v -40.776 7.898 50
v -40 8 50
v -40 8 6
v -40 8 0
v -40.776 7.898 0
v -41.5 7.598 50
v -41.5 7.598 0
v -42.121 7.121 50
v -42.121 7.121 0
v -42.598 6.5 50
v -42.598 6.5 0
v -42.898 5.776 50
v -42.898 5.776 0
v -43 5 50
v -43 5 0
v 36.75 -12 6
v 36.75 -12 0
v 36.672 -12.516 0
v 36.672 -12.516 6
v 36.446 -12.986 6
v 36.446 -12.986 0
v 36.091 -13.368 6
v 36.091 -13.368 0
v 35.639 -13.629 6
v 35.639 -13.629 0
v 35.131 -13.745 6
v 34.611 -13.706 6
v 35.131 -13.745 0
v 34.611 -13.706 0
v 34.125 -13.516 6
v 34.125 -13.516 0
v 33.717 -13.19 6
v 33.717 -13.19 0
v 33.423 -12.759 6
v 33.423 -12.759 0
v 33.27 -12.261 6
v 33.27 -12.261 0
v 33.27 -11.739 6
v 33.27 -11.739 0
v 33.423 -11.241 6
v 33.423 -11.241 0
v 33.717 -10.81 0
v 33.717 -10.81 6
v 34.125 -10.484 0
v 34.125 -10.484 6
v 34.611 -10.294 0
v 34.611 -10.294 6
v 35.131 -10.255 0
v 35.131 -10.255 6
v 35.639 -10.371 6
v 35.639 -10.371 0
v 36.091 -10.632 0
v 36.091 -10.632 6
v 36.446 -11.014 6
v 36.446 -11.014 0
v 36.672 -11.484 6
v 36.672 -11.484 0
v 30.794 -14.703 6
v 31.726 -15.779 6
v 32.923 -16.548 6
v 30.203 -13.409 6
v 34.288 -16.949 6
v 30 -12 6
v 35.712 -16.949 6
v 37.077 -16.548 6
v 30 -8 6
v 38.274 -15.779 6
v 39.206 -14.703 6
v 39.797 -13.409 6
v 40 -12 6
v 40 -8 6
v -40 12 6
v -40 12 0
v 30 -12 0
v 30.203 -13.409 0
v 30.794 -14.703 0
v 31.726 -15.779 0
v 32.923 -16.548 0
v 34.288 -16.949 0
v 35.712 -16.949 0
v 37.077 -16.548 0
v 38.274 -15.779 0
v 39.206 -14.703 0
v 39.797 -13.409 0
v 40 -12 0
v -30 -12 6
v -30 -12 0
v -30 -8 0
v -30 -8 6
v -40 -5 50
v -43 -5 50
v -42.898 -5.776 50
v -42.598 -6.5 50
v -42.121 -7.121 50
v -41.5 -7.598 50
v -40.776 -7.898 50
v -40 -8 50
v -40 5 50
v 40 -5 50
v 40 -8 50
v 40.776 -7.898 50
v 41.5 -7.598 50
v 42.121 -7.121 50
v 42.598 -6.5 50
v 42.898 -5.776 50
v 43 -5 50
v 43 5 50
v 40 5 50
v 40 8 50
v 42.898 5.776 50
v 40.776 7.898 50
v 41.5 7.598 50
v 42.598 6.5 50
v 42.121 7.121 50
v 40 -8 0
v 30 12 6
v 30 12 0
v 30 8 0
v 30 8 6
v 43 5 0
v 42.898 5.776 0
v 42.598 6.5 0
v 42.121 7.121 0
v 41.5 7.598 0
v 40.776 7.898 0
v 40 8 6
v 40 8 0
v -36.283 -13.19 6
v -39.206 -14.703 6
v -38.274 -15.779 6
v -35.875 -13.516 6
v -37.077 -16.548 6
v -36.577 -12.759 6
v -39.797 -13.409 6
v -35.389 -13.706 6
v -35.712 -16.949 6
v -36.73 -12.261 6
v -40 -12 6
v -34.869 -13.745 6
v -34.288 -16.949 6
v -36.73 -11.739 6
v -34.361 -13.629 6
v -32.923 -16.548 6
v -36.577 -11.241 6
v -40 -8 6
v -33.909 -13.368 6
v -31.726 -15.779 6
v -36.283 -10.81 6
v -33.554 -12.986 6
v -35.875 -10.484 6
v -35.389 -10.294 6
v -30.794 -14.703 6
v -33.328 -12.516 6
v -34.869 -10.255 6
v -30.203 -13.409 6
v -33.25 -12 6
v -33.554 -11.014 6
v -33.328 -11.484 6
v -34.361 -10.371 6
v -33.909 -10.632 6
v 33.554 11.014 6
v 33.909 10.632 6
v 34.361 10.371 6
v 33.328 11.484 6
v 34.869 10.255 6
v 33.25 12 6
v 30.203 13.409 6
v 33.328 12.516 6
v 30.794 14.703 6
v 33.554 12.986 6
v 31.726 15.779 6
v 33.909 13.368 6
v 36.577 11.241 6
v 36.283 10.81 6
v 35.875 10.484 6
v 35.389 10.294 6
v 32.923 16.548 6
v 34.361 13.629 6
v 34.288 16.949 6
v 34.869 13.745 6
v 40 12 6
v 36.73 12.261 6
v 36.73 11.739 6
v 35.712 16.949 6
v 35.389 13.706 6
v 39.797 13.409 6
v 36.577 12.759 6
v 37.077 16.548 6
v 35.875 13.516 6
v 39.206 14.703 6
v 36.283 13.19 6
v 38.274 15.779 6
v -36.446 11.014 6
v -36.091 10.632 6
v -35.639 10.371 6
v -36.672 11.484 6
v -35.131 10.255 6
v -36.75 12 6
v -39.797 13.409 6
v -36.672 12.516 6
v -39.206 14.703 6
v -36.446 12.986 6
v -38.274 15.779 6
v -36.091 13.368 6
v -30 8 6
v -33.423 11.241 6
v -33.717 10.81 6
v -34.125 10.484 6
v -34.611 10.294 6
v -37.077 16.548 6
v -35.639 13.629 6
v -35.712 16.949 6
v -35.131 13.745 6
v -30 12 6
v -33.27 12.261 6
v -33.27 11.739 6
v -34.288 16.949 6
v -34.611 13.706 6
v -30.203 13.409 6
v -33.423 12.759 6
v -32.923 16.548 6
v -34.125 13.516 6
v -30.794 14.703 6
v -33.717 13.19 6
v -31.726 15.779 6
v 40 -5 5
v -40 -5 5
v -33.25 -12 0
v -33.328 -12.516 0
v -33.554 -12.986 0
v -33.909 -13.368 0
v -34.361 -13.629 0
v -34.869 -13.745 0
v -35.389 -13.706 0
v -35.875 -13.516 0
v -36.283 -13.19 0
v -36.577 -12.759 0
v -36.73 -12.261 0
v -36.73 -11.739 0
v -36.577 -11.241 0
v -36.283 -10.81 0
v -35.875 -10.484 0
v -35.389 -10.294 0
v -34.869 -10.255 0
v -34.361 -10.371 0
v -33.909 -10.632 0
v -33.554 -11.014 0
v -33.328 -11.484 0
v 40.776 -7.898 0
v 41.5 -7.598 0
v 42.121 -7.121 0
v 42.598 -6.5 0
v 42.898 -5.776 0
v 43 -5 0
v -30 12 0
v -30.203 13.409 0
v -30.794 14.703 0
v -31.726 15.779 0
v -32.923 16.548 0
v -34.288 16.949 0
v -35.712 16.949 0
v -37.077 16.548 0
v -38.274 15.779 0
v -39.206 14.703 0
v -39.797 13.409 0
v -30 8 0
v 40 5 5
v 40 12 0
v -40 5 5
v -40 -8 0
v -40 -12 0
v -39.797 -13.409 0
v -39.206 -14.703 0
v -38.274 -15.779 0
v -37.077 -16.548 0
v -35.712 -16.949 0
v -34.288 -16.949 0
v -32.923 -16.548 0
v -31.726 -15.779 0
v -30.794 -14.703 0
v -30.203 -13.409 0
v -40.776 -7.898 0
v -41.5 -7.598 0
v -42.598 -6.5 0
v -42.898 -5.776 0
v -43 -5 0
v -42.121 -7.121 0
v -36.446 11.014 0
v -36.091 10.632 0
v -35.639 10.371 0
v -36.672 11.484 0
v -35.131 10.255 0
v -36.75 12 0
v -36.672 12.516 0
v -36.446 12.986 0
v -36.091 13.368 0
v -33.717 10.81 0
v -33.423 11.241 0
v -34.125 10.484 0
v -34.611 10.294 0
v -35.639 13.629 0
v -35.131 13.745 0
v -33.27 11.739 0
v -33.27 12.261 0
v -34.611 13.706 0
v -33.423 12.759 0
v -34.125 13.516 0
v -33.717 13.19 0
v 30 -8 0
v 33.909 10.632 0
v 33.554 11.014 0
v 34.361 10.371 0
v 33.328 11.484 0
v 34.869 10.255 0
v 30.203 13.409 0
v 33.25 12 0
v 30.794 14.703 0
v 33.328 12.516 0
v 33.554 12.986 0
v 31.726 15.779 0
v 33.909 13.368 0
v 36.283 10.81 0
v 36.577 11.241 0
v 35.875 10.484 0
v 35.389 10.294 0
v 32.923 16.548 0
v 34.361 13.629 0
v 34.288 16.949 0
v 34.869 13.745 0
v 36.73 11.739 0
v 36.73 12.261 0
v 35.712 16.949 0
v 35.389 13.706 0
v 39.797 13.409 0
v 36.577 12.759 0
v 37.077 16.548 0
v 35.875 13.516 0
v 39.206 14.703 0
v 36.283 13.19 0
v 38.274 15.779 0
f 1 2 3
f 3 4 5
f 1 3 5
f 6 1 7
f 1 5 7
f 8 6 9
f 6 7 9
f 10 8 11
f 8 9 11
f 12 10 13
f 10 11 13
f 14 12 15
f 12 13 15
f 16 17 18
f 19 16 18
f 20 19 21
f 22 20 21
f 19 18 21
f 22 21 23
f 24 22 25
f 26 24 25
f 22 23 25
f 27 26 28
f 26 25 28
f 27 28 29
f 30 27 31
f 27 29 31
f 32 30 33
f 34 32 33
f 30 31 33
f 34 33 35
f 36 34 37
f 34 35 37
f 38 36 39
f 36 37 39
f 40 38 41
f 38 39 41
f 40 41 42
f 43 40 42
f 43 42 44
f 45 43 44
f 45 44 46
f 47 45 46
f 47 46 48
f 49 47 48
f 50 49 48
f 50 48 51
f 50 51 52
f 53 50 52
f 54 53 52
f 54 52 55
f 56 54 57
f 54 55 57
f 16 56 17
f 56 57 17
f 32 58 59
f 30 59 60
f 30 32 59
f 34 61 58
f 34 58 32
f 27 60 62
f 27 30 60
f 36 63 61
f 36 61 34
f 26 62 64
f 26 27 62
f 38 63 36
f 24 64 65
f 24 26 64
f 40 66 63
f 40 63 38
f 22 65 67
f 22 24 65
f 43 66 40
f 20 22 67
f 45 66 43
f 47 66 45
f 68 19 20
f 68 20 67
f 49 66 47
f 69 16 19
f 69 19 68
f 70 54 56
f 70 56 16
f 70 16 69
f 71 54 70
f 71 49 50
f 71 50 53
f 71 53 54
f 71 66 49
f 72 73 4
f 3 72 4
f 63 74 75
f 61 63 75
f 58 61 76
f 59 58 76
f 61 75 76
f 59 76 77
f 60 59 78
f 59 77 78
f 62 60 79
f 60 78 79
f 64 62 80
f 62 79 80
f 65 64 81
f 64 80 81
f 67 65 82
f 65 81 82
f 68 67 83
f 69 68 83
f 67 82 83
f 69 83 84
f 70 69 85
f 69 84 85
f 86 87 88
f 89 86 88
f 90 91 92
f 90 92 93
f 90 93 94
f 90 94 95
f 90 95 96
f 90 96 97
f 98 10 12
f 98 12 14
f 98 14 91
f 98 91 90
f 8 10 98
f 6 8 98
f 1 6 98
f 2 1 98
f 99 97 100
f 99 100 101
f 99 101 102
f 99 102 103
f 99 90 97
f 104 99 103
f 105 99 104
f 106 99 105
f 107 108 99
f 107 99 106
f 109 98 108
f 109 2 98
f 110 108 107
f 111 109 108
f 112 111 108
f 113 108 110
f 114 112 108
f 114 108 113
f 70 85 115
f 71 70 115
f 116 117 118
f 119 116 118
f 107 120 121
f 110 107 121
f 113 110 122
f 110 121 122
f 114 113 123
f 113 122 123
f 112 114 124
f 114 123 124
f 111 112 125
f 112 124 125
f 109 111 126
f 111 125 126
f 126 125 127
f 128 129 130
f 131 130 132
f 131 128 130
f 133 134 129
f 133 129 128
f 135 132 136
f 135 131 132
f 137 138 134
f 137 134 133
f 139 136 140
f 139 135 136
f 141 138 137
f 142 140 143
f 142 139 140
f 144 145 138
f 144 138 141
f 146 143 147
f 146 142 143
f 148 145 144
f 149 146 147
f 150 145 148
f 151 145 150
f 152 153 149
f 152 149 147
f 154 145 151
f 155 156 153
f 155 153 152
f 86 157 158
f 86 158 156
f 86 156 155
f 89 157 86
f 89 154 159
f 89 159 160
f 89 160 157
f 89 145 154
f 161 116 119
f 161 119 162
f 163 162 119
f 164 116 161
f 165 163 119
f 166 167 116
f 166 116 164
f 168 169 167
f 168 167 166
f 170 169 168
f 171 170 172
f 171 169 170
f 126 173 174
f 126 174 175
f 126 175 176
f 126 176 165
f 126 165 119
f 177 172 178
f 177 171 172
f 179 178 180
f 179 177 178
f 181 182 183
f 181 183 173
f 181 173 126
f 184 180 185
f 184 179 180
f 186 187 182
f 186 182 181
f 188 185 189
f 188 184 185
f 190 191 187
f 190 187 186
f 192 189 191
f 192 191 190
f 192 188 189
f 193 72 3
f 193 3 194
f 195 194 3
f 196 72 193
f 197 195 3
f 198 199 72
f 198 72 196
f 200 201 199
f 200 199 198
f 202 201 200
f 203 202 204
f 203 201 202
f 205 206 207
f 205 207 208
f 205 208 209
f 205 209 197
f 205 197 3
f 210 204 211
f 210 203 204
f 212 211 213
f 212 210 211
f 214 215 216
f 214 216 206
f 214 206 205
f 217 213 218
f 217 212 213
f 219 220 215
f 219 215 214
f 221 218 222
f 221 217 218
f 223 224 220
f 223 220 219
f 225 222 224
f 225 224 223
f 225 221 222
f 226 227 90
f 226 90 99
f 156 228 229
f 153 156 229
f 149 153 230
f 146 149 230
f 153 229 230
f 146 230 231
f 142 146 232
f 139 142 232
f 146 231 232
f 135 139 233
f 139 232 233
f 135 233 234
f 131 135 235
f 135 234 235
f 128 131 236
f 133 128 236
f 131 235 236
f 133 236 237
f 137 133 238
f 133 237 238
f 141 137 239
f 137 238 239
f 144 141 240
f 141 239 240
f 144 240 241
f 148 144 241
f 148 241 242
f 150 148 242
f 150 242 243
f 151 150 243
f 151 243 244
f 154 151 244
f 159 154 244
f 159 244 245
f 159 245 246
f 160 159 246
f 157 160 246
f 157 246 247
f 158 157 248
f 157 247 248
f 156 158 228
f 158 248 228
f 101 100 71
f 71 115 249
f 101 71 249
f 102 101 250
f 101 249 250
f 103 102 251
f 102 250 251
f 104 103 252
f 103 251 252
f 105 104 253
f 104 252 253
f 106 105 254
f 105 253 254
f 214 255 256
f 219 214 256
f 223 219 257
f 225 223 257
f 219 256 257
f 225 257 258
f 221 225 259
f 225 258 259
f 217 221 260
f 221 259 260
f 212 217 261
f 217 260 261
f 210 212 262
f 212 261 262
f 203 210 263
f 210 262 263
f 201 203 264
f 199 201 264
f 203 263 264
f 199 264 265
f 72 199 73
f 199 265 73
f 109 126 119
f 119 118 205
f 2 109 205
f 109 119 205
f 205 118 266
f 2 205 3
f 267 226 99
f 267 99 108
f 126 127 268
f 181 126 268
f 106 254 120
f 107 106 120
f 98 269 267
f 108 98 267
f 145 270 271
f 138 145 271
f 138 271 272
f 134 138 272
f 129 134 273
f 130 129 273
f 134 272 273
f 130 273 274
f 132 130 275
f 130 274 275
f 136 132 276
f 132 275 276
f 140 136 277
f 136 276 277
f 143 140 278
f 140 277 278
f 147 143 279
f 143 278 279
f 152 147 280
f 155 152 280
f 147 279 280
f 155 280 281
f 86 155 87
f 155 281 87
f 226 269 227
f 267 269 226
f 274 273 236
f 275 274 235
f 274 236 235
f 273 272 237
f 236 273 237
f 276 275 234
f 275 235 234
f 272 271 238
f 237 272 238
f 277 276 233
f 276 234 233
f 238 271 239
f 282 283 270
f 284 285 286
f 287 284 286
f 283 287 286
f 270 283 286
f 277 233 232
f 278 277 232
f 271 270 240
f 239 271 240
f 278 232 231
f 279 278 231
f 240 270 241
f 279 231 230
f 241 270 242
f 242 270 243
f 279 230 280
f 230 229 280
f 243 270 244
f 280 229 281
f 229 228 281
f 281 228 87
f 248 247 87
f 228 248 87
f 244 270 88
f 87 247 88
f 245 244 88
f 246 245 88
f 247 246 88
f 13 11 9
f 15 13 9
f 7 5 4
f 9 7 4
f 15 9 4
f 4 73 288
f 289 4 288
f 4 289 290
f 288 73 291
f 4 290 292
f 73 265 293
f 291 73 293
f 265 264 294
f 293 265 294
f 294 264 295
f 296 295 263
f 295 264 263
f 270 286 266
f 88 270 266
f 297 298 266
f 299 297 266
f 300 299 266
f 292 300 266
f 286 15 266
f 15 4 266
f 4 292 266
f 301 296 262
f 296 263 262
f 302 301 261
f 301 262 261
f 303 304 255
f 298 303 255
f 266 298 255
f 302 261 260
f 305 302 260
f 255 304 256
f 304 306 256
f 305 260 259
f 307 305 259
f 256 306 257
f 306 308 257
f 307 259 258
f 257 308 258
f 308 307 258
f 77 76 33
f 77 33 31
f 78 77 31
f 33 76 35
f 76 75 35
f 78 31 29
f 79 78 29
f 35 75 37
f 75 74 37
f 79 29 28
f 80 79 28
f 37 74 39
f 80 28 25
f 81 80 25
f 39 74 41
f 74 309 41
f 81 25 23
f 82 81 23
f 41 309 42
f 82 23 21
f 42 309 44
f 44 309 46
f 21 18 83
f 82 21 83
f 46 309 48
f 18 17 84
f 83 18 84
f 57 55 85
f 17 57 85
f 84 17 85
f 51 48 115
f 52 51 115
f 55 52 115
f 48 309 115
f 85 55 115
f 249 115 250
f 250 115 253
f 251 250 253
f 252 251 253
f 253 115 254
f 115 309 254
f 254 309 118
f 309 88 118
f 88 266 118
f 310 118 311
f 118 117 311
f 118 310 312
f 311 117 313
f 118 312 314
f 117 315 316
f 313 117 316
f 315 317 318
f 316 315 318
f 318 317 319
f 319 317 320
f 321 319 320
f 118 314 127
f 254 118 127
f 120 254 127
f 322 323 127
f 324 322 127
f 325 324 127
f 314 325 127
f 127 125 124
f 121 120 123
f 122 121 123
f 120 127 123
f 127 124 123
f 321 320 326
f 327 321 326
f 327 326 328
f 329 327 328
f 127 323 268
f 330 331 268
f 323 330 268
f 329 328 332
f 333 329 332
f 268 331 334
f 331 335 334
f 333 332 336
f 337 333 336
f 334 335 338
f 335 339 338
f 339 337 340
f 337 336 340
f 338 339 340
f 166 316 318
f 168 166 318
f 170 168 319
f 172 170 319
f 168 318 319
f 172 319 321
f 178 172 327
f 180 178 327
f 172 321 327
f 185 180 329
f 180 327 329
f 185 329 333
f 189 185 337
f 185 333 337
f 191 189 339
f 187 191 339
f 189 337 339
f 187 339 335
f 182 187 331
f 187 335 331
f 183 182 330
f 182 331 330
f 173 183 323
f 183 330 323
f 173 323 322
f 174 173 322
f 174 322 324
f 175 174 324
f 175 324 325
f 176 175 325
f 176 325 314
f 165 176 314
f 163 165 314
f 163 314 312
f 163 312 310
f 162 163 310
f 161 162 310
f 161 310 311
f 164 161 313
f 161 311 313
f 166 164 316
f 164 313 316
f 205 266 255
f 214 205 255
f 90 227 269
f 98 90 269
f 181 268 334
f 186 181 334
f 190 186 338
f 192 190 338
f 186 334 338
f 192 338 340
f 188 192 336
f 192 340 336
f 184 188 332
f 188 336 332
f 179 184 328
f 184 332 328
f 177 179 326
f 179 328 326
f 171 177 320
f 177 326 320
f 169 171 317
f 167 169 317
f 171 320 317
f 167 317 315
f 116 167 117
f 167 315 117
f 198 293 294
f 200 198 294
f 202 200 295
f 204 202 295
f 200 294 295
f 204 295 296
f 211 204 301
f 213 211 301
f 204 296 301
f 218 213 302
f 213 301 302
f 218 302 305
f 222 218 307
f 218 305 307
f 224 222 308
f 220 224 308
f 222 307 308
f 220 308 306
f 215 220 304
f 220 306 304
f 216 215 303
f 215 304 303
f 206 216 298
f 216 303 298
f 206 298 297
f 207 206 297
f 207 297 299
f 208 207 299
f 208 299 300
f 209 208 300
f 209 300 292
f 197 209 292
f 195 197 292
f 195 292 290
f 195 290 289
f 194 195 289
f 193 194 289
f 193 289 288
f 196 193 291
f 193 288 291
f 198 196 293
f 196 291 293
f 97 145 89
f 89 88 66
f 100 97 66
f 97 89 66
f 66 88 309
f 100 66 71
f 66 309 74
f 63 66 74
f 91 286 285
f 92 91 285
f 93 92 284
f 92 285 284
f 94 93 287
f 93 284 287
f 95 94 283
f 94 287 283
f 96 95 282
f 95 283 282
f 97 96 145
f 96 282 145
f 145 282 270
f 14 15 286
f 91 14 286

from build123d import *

# Parameters (mm, degrees)
F0_W     = 80
F0_H     = 10
F1_DEPTH = 50
F2_W     = 80
F2_H     = 10
F3_DEPTH = 5
F4_DEPTH = 6


with BuildPart() as f1:
    # F0 (on Top) → F1 (new body)
    with BuildSketch(Plane.XY):
        with BuildLine():
            ThreePointArc((43, 5), (42.12132, 7.12132), (40, 8))
            Line((40, 8), (30, 8))
            Line((30, 8), (-30, 8))
            Line((-30, 8), (-40, 8))
            ThreePointArc((-40, 8), (-42.12132, 7.12132), (-43, 5))
            Line((-43, 5), (-43, -5))
            ThreePointArc((-43, -5), (-42.12132, -7.12132), (-40, -8))
            Line((-40, -8), (-30, -8))
            Line((-30, -8), (30, -8))
            Line((30, -8), (40, -8))
            ThreePointArc((40, -8), (42.12132, -7.12132), (43, -5))
            Line((43, -5), (43, 5))
        make_face()
        Rectangle(F0_W, F0_H, mode=Mode.SUBTRACT)
    extrude(amount=F1_DEPTH)

    # F2 (on Top) → F3 (join)
    with BuildSketch(Plane.XY):
        Rectangle(F2_W, F2_H)
    extrude(amount=F3_DEPTH)

    # F0 (on Top) → F4 (join)
    with BuildSketch(Plane.XY):
        with BuildLine():
            ThreePointArc((43, 5), (42.12132, 7.12132), (40, 8))
            Line((40, 8), (30, 8))
            Line((30, 8), (-30, 8))
            Line((-30, 8), (-40, 8))
            ThreePointArc((-40, 8), (-42.12132, 7.12132), (-43, 5))
            Line((-43, 5), (-43, -5))
            ThreePointArc((-43, -5), (-42.12132, -7.12132), (-40, -8))
            Line((-40, -8), (-30, -8))
            Line((-30, -8), (30, -8))
            Line((30, -8), (40, -8))
            ThreePointArc((40, -8), (42.12132, -7.12132), (43, -5))
            Line((43, -5), (43, 5))
        make_face()
        Rectangle(F0_W, F0_H, mode=Mode.SUBTRACT)
        with BuildLine():
            Line((30, 8), (40, 8))
            Line((40, 8), (40, 12))
            Line((40, 12), (36.75, 12))
            ThreePointArc((36.75, 12), (35, 10.25), (33.25, 12))
            Line((33.25, 12), (30, 12))
            Line((30, 12), (30, 8))
        make_face()
        with BuildLine():
            Line((36.75, 12), (40, 12))
            ThreePointArc((40, 12), (35, 17), (30, 12))
            Line((30, 12), (33.25, 12))
            ThreePointArc((33.25, 12), (35, 13.75), (36.75, 12))
        make_face()
        with BuildLine():
            Line((-40, 8), (-30, 8))
            Line((-30, 8), (-30, 12))
            Line((-30, 12), (-33.25, 12))
            ThreePointArc((-33.25, 12), (-35, 10.25), (-36.75, 12))
            Line((-36.75, 12), (-40, 12))
            Line((-40, 12), (-40, 8))
        make_face()
        with BuildLine():
            Line((-33.25, 12), (-30, 12))
            ThreePointArc((-30, 12), (-35, 17), (-40, 12))
            Line((-40, 12), (-36.75, 12))
            ThreePointArc((-36.75, 12), (-35, 13.75), (-33.25, 12))
        make_face()
        with BuildLine():
            Line((40, -12), (40, -8))
            Line((40, -8), (30, -8))
            Line((30, -8), (30, -12))
            Line((30, -12), (33.25, -12))
            ThreePointArc((33.25, -12), (35, -10.25), (36.75, -12))
            Line((36.75, -12), (40, -12))
        make_face()
        with BuildLine():
            ThreePointArc((30, -12), (35, -17), (40, -12))
            Line((40, -12), (36.75, -12))
            ThreePointArc((36.75, -12), (35, -13.75), (33.25, -12))
            Line((33.25, -12), (30, -12))
        make_face()
        with BuildLine():
            Line((-30, -12), (-30, -8))
            Line((-30, -8), (-40, -8))
            Line((-40, -8), (-40, -12))
            Line((-40, -12), (-36.75, -12))
            ThreePointArc((-36.75, -12), (-35, -10.25), (-33.25, -12))
            Line((-33.25, -12), (-30, -12))
        make_face()
        with BuildLine():
            ThreePointArc((-40, -12), (-35, -17), (-30, -12))
            Line((-30, -12), (-33.25, -12))
            ThreePointArc((-33.25, -12), (-35, -13.75), (-36.75, -12))
            Line((-36.75, -12), (-40, -12))
        make_face()
    extrude(amount=F4_DEPTH)


solid = f1.part
